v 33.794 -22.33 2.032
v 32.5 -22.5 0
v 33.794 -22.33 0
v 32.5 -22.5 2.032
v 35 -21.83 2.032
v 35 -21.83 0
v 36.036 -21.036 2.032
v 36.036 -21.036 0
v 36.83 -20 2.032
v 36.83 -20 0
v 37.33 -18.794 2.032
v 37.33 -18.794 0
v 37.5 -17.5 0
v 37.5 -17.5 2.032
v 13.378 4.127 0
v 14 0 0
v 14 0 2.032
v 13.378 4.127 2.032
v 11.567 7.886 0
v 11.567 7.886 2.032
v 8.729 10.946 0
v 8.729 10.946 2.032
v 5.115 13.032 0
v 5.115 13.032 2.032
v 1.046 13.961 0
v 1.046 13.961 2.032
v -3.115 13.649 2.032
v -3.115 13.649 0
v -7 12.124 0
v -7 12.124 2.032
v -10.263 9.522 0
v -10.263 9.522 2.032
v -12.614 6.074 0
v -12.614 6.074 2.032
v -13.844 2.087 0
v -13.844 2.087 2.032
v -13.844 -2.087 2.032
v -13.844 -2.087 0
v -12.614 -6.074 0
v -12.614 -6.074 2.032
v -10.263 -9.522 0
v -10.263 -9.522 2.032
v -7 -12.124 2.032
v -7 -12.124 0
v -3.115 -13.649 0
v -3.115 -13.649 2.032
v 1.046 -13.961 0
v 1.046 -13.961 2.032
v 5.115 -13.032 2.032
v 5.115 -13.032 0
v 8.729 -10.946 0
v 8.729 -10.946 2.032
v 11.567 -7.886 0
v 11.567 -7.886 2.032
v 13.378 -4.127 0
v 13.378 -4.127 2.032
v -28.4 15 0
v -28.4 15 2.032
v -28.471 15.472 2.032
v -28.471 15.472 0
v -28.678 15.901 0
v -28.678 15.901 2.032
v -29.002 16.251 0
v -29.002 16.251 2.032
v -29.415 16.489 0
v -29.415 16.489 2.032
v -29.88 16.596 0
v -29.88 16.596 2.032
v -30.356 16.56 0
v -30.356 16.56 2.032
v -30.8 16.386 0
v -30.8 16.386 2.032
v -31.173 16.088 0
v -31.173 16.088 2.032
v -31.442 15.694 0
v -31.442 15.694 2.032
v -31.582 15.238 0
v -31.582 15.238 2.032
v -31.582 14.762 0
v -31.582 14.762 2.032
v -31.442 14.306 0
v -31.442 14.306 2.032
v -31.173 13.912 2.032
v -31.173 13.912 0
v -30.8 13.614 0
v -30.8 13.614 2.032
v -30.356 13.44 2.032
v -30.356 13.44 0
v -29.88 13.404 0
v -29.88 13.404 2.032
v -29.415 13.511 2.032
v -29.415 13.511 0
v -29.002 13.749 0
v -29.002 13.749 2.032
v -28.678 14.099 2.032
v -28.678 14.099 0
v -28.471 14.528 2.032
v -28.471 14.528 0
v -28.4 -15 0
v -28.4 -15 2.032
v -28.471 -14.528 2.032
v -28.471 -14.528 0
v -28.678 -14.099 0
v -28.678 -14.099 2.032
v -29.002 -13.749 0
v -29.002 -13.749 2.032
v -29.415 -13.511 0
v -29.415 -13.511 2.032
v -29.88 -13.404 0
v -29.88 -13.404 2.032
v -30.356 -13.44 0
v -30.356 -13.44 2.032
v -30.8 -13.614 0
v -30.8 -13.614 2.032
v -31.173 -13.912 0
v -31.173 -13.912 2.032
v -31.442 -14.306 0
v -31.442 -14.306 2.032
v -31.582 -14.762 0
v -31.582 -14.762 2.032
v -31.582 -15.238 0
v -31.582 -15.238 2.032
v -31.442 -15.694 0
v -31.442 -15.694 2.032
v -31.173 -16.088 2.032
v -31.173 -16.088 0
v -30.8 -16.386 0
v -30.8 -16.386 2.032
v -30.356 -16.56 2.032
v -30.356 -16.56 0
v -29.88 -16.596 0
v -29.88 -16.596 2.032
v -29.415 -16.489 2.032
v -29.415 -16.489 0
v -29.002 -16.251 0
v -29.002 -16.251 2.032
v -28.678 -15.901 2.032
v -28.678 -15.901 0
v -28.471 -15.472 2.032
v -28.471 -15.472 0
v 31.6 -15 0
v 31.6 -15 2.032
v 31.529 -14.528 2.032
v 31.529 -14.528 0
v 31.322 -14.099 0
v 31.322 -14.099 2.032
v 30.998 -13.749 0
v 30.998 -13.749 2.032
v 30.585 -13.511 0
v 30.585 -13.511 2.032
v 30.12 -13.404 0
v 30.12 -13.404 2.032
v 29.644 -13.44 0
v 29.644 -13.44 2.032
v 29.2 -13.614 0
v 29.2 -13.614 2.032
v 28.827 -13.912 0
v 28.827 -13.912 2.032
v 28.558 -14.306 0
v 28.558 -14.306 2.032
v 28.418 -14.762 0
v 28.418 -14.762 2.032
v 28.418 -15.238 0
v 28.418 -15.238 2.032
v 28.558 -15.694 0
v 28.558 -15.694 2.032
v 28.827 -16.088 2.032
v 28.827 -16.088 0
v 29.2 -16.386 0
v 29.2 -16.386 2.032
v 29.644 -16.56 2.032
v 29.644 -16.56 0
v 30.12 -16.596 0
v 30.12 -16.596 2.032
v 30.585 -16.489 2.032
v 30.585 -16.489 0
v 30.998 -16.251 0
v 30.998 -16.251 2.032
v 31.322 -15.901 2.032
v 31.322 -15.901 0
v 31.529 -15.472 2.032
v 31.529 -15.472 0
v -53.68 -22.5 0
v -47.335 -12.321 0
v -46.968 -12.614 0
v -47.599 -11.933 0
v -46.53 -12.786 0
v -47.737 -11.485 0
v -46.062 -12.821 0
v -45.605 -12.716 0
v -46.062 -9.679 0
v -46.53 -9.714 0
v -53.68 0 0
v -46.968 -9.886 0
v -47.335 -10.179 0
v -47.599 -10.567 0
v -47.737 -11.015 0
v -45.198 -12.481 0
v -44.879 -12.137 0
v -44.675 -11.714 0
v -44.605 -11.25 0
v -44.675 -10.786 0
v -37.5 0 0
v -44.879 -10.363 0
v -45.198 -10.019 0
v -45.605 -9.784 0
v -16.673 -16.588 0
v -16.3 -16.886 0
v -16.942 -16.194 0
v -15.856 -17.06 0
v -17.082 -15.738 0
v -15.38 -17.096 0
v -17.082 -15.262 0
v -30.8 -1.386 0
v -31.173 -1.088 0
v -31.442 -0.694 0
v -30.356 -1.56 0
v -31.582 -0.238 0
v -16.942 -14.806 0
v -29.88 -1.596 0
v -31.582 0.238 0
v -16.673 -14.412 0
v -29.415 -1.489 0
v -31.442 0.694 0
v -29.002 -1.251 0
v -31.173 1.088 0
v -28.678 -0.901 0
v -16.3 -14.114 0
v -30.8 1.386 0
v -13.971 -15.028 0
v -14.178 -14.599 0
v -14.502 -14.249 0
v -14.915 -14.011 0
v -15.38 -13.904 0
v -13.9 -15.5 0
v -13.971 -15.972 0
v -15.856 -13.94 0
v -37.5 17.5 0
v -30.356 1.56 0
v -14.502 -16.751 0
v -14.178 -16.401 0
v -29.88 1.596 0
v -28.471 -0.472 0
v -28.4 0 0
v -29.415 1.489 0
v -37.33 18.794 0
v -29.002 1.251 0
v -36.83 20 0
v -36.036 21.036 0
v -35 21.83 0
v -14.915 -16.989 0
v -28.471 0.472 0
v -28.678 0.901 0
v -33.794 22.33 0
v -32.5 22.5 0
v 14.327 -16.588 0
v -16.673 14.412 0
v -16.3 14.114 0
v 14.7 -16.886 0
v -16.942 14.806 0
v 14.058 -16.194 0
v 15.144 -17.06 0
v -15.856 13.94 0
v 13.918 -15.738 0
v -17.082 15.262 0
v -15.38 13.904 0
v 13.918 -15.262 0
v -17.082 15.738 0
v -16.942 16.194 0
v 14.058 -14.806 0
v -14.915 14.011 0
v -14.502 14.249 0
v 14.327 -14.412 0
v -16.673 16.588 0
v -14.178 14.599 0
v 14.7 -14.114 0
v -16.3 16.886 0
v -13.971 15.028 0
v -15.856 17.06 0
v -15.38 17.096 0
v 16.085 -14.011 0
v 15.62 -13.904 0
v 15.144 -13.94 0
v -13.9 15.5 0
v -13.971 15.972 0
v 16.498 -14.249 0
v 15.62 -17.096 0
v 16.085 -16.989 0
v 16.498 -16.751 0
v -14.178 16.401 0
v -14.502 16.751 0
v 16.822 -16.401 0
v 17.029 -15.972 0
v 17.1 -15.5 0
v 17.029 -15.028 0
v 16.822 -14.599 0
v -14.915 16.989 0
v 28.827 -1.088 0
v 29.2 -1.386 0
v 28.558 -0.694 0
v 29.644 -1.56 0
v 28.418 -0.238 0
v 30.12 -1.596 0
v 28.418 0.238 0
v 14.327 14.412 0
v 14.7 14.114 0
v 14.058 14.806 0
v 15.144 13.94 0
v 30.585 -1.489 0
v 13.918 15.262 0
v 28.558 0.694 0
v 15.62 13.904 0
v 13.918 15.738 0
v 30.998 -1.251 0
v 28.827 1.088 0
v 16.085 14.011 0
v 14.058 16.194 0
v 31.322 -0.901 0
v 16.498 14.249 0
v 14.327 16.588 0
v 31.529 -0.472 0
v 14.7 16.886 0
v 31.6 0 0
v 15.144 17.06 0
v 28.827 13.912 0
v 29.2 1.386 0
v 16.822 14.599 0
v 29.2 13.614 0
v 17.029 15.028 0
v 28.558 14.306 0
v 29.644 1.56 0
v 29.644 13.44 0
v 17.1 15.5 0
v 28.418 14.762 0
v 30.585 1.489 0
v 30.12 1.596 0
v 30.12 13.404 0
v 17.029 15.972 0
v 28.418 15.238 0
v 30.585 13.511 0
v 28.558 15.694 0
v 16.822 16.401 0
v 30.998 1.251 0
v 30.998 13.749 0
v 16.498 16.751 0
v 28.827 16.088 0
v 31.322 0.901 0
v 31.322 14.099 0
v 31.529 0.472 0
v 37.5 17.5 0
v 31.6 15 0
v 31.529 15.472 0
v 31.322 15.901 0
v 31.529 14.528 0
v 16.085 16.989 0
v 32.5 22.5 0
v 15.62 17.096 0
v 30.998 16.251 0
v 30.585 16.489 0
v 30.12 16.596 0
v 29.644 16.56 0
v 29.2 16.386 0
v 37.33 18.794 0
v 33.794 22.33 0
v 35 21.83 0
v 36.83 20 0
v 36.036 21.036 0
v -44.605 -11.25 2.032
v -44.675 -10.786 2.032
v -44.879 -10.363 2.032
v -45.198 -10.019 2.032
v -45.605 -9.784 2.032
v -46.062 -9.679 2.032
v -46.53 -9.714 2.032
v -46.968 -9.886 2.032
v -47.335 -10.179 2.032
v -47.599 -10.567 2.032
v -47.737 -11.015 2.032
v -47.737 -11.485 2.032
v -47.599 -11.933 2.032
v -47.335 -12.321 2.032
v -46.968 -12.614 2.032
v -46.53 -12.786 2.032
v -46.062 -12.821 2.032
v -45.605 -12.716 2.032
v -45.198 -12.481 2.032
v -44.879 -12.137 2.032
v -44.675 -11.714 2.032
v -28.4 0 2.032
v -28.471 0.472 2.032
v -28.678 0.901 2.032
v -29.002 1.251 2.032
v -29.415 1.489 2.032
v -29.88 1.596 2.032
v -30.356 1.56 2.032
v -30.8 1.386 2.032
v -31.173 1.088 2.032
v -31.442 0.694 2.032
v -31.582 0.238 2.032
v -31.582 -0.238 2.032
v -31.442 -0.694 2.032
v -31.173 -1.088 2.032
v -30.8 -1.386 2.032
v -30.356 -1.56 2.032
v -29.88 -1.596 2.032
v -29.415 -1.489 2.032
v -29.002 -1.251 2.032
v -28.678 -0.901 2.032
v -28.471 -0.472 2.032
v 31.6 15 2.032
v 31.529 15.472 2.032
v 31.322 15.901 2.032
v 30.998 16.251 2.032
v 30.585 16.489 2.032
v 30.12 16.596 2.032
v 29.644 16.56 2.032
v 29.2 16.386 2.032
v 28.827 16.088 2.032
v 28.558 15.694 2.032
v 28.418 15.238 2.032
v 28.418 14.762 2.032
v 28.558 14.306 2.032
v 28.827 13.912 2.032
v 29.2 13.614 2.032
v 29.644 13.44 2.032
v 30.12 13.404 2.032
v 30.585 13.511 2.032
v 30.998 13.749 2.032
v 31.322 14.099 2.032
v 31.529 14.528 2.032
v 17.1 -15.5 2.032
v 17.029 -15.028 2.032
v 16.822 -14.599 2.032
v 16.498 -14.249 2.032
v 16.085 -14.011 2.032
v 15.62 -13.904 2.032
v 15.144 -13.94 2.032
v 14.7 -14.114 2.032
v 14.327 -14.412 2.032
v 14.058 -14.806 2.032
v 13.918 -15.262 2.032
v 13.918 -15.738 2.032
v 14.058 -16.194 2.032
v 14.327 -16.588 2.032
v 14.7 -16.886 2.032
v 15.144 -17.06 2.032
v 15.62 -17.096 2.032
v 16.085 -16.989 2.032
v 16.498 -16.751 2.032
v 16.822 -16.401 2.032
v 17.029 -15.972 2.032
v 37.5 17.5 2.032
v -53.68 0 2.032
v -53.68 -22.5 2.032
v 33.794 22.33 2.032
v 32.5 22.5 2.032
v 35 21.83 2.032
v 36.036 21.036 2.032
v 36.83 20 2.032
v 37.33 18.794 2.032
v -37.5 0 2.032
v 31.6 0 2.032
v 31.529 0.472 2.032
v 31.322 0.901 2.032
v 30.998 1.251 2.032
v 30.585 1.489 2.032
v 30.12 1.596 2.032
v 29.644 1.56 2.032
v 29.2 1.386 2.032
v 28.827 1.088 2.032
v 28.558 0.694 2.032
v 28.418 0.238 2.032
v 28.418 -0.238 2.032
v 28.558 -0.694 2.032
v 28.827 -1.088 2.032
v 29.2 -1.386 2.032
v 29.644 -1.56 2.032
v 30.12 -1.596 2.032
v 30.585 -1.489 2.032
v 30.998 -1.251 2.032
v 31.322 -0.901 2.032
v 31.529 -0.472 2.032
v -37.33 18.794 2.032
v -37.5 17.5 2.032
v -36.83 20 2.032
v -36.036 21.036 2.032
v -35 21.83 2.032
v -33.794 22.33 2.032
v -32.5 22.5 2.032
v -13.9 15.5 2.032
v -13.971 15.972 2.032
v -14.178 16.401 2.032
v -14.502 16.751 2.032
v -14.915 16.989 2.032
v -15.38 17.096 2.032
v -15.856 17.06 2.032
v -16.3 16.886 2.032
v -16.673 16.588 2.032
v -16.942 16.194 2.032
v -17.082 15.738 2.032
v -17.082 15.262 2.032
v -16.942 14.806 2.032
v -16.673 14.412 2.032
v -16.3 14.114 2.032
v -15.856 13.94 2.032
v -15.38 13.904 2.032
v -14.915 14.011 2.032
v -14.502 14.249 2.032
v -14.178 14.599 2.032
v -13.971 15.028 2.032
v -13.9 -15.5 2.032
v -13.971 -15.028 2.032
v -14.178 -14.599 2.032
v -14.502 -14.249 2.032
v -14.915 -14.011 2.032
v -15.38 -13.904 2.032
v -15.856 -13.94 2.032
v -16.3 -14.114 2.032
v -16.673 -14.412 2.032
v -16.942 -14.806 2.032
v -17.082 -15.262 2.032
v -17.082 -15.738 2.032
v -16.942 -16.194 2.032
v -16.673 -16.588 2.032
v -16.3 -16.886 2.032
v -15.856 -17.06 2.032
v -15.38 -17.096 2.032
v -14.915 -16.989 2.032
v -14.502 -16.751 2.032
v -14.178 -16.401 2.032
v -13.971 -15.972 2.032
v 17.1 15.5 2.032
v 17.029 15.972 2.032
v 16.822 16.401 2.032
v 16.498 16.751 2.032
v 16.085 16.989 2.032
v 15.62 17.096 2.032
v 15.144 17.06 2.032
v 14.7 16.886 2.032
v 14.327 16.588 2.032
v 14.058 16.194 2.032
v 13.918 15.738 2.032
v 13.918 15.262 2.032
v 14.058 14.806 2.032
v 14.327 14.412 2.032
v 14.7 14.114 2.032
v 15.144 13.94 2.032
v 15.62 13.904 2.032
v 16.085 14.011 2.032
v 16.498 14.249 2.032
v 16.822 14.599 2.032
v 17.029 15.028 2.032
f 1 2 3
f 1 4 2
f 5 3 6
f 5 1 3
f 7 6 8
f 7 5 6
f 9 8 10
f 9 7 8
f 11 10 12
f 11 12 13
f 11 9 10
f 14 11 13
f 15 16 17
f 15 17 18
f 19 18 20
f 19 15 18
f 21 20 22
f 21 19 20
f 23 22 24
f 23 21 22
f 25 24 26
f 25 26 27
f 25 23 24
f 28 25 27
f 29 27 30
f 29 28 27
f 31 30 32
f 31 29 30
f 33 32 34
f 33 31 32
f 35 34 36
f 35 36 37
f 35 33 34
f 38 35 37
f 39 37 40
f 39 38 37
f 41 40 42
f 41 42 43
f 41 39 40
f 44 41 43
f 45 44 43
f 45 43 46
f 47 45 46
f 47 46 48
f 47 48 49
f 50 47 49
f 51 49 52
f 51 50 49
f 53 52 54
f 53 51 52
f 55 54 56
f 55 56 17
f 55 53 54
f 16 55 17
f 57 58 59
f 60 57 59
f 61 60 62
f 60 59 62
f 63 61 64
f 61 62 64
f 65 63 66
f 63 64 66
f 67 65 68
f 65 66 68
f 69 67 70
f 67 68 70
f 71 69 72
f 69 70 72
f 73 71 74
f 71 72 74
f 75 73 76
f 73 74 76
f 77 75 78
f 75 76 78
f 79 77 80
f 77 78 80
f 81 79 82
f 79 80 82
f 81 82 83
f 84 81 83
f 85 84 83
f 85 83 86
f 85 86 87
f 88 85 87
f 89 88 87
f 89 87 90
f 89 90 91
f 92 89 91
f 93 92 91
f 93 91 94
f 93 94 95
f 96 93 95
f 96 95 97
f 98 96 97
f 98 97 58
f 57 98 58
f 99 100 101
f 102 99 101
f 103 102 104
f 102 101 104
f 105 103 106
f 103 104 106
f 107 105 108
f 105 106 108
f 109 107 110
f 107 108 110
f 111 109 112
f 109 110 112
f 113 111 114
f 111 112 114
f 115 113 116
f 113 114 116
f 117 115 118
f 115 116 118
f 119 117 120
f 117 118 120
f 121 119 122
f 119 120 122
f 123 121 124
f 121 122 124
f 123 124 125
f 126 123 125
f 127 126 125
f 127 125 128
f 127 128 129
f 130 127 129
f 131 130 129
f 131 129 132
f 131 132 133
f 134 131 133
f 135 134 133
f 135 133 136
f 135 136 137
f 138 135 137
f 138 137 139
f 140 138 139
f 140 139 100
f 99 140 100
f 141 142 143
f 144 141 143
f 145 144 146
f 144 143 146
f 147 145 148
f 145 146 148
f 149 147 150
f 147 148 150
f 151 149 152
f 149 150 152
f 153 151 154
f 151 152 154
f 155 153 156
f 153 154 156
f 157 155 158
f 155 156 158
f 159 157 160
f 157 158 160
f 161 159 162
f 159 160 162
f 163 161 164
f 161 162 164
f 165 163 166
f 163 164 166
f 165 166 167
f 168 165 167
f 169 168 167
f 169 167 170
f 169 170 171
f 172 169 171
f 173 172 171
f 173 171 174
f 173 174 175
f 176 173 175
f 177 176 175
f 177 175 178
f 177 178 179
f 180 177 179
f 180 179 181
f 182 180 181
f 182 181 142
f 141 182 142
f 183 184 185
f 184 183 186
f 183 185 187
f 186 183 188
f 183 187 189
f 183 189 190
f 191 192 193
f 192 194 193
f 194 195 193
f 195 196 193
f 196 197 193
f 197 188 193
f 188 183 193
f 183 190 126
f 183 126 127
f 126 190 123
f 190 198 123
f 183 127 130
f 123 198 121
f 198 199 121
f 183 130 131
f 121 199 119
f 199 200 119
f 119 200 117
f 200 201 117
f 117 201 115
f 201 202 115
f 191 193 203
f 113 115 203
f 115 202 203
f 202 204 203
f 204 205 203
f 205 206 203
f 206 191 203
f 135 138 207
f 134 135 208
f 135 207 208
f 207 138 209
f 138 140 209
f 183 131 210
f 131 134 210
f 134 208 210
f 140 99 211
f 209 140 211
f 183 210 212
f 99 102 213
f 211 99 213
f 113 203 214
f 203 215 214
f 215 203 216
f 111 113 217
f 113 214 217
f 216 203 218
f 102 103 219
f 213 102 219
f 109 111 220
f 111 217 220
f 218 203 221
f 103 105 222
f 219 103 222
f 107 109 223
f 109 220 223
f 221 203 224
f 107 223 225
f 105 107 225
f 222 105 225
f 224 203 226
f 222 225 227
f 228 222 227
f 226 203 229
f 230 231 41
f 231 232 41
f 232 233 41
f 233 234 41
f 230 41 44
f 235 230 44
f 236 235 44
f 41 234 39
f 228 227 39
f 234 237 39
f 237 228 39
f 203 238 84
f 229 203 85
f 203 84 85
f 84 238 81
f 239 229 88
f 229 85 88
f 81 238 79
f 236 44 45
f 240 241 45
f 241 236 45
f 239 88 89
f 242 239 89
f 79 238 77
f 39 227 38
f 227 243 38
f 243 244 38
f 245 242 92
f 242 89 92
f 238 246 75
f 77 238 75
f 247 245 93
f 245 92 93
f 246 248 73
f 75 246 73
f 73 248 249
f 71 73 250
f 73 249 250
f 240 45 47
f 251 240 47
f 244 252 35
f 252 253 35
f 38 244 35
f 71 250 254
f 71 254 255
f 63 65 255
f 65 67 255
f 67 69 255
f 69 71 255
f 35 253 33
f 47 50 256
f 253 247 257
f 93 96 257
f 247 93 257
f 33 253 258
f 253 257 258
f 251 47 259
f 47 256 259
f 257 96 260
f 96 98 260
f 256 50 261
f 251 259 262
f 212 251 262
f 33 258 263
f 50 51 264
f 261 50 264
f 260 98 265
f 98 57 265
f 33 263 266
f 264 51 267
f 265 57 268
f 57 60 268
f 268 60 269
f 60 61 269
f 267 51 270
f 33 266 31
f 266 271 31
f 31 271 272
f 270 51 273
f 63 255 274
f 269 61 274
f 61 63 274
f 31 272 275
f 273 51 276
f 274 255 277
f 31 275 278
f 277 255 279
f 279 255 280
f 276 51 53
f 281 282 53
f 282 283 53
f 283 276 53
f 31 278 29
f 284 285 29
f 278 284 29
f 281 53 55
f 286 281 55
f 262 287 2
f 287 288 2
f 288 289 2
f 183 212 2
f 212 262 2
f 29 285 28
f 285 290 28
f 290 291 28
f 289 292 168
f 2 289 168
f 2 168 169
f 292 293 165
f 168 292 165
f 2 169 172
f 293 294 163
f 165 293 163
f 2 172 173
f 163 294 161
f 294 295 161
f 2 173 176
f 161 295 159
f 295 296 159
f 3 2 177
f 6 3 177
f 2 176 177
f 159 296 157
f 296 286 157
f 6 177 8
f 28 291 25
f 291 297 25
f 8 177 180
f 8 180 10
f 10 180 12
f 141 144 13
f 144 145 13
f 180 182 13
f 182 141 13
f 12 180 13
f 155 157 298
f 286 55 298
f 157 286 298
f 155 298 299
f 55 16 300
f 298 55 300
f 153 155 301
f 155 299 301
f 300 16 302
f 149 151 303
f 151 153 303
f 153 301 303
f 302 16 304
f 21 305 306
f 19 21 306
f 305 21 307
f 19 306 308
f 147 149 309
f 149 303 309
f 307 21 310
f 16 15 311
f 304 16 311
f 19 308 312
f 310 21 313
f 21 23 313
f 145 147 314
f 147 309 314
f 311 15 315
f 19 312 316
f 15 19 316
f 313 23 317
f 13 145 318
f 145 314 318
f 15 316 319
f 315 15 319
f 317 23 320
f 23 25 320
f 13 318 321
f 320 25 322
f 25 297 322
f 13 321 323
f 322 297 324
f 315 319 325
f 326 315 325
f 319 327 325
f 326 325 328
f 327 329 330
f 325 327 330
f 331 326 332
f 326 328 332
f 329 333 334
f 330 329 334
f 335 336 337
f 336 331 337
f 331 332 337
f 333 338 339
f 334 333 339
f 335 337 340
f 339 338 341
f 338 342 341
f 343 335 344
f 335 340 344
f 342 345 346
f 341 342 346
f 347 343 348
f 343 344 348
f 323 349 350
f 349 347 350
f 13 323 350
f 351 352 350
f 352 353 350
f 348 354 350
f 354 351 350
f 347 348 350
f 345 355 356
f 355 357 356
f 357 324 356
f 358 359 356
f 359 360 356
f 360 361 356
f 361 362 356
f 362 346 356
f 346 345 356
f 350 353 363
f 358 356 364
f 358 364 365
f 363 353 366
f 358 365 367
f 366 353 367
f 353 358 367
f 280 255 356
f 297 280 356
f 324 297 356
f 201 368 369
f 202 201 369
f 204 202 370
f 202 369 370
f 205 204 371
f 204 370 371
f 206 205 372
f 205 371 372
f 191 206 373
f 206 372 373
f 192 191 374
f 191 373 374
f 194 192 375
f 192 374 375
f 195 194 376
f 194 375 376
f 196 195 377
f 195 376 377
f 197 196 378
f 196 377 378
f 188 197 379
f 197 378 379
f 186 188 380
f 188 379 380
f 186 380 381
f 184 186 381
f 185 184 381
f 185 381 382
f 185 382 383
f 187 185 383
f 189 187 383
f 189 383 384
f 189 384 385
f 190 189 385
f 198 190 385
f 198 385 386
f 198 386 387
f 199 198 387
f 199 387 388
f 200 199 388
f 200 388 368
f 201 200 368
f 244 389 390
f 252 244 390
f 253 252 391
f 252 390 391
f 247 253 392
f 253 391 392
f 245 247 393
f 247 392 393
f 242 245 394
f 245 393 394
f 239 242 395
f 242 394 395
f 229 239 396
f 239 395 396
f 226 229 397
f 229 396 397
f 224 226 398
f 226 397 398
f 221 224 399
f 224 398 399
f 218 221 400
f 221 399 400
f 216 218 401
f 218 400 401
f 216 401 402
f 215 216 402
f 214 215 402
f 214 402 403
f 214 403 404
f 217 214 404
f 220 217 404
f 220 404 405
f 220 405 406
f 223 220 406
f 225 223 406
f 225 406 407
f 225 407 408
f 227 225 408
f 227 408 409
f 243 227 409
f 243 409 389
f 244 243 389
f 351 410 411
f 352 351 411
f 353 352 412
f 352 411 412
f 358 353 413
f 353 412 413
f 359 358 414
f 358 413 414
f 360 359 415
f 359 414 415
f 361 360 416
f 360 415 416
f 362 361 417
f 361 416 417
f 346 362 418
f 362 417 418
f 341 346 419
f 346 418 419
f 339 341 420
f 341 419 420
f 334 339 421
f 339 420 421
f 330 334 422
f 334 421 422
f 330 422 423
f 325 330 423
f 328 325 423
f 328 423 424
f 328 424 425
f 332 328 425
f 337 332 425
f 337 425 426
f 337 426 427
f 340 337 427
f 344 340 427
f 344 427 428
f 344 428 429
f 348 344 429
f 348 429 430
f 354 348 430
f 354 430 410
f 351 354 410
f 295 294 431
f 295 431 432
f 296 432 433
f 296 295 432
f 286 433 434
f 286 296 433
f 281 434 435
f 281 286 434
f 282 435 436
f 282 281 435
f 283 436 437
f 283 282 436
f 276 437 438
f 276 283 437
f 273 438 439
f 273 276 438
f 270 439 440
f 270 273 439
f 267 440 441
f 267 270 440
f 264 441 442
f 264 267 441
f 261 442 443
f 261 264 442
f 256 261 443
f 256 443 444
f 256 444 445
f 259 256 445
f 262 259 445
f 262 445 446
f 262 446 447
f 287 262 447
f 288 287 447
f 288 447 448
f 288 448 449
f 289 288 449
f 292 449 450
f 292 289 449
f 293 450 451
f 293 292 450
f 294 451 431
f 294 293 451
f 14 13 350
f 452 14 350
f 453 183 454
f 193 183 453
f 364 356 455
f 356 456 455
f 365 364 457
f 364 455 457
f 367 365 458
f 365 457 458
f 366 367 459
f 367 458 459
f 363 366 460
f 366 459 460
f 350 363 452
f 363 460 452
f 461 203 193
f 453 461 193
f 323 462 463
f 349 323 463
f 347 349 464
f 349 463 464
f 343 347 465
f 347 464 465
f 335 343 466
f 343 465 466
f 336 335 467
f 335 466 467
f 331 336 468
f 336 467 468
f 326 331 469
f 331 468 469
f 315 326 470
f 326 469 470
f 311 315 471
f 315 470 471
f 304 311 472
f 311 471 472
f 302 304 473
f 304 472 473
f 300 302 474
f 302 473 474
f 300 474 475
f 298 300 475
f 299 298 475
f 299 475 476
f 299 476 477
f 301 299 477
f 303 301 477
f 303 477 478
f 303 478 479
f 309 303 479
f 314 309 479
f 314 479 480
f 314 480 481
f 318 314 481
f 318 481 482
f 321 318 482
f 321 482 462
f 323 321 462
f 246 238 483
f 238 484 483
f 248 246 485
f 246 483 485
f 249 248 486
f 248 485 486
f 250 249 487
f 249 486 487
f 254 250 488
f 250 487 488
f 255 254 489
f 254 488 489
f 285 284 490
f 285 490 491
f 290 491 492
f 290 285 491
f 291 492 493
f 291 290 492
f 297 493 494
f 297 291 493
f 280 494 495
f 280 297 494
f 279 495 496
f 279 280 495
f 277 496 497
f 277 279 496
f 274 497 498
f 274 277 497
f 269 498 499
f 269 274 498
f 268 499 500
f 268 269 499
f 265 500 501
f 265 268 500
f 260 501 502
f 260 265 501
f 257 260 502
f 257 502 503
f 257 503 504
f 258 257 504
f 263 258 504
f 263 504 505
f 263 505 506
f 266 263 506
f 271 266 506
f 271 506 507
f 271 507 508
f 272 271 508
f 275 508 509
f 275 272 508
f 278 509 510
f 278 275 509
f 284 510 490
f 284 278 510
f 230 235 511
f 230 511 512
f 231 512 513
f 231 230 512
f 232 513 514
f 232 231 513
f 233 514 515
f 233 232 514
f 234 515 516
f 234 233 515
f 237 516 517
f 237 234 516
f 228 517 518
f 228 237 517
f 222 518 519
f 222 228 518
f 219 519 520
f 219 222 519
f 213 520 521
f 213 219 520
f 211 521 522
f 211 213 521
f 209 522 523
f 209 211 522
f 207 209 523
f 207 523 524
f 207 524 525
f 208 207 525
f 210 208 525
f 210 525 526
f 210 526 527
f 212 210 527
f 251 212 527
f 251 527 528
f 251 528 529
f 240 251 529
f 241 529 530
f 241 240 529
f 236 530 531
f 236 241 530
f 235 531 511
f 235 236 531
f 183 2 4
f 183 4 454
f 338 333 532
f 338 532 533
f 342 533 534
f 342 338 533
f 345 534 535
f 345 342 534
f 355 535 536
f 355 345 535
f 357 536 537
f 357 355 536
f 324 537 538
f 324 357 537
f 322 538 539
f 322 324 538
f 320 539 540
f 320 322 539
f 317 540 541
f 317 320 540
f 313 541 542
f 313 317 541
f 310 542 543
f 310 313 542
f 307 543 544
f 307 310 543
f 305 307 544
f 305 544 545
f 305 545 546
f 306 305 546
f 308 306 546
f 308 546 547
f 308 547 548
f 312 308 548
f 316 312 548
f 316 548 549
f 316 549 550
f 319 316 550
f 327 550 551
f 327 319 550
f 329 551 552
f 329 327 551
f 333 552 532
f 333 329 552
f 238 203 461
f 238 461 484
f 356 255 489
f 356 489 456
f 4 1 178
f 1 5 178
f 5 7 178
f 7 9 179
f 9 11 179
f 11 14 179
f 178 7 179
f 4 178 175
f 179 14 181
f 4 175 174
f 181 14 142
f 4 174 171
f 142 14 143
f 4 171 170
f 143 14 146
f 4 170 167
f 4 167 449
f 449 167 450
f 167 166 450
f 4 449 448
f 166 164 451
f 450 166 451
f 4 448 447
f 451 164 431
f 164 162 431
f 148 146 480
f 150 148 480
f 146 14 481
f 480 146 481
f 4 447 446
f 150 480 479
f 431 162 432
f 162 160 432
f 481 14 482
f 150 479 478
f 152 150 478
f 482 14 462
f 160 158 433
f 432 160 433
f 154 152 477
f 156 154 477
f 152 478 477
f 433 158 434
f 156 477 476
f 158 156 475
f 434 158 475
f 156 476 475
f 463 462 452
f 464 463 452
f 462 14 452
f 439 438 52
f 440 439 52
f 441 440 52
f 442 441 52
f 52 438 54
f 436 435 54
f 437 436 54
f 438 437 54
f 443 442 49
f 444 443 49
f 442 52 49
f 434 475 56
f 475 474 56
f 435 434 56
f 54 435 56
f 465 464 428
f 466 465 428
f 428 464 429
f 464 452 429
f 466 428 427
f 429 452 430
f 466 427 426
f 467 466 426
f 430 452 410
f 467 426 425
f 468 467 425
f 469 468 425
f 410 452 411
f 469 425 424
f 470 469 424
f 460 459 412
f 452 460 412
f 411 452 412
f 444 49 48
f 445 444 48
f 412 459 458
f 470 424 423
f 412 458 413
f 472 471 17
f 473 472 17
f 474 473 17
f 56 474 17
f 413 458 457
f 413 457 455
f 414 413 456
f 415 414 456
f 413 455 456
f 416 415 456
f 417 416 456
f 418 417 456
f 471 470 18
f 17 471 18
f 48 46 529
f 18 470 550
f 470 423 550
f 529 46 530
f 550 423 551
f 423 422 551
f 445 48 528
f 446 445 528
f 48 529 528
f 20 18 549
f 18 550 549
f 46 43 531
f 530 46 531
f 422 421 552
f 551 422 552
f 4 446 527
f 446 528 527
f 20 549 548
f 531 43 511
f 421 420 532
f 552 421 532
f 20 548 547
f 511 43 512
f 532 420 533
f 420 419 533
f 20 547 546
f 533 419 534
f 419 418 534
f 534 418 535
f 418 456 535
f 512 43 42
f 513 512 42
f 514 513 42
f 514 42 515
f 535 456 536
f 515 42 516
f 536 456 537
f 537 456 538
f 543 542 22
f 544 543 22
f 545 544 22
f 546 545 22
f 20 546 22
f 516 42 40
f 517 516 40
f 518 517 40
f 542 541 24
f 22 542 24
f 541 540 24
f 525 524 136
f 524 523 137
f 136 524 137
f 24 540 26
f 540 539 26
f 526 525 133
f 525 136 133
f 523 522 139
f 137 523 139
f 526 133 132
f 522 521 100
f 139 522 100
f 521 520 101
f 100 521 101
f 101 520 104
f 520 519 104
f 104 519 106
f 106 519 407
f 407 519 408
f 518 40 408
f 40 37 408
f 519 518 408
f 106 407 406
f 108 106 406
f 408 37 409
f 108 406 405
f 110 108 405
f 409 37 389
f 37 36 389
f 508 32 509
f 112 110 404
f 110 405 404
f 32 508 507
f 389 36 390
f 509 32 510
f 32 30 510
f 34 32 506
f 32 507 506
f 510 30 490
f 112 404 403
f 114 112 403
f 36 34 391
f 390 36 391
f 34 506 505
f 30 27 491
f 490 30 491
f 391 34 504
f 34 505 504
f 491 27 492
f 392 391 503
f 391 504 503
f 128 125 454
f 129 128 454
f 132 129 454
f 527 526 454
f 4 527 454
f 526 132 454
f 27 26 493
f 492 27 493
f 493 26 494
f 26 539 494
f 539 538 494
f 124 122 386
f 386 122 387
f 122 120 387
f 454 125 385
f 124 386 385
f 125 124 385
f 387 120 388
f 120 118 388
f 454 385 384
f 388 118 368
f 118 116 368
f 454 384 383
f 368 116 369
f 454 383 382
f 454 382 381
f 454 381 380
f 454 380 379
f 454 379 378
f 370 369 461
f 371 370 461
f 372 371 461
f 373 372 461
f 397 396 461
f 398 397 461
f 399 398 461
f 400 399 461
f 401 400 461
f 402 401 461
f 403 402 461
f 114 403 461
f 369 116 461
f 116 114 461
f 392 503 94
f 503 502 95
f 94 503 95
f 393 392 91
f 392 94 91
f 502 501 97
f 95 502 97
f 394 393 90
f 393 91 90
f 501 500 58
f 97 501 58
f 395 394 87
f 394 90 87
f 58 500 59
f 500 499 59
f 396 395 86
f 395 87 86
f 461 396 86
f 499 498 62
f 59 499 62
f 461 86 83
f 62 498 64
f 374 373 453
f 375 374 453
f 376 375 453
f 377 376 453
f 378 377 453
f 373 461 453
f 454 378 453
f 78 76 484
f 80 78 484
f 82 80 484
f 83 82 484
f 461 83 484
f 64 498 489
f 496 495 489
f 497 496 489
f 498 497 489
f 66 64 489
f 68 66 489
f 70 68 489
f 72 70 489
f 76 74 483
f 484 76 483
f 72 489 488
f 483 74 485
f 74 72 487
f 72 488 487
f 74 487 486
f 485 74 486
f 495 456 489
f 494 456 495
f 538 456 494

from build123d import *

# Parameters (mm, degrees)
SKETCH1_W               = 75
SKETCH1_H               = 45
SKETCH1_R               = 14
SKETCH1_R_2             = 1.6
BOSS_EXTRUDE1_DEPTH     = 2.032
FILLET2_R               = 5
SKETCH2_R               = 1.6
CUT_EXTRUDE1_DEPTH      = 3.032
SKETCH4_W               = 21.18
SKETCH4_H               = 22.5
BOSS_EXTRUDE2_DEPTH     = 2.032
MOUNTING_HOLE_SKETCH_R  = 1.575
MOUNTING_HOLE_CUT_DEPTH = 3.032


with BuildPart() as part:
    # Sketch1 → Boss-Extrude1 (new body)
    with BuildSketch(Plane.XY):
        Rectangle(SKETCH1_W, SKETCH1_H)
        Circle(SKETCH1_R, mode=Mode.SUBTRACT)
        with Locations((-15.5, 15.5)):
            Circle(SKETCH1_R_2, mode=Mode.SUBTRACT)
        with Locations((15.5, 15.5)):
            Circle(SKETCH1_R_2, mode=Mode.SUBTRACT)
        with Locations((15.5, -15.5)):
            Circle(SKETCH1_R_2, mode=Mode.SUBTRACT)
        with Locations((-15.5, -15.5)):
            Circle(SKETCH1_R_2, mode=Mode.SUBTRACT)
    extrude(amount=BOSS_EXTRUDE1_DEPTH)

    # Fillet2
    fillet2_edges = [part.edges().sort_by_distance(p)[0] for p in [
        (37.5, -22.5, 1.016),
        (-37.5, -22.5, 1.016),
        (-37.5, 22.5, 1.016),
        (37.5, 22.5, 1.016),
    ]]
    fillet(fillet2_edges, radius=FILLET2_R)

    # Sketch2 → Cut-Extrude1 (cut, through all)
    with BuildSketch(Plane.XY.offset(2.032)):
        with Locations((-30, 0)):
            Circle(SKETCH2_R)
        with Locations((-30, 15)):
            Circle(SKETCH2_R)
        with Locations((-30, -15)):
            Circle(SKETCH2_R)
        with Locations((30, -15)):
            Circle(SKETCH2_R)
        with Locations((30, 15)):
            Circle(SKETCH2_R)
        with Locations((30, 0)):
            Circle(SKETCH2_R)
    extrude(amount=-CUT_EXTRUDE1_DEPTH, mode=Mode.SUBTRACT)

    # Sketch4 → Boss-Extrude2 (add)
    with BuildSketch(Plane(origin=(0, 0, 0), x_dir=(-1, 0, 0), z_dir=(0, 0, -1))):
        with Locations((43.09, -11.25)):
            Rectangle(SKETCH4_W, SKETCH4_H)
    extrude(amount=-BOSS_EXTRUDE2_DEPTH)

    # Mounting Hole Sketch → Mounting Hole Cut (cut, through all)
    with BuildSketch(Plane.XY.offset(2.032)):
        with Locations((-46.18, -11.25)):
            Circle(MOUNTING_HOLE_SKETCH_R)
    extrude(amount=-MOUNTING_HOLE_CUT_DEPTH, mode=Mode.SUBTRACT)


solid = part.part
